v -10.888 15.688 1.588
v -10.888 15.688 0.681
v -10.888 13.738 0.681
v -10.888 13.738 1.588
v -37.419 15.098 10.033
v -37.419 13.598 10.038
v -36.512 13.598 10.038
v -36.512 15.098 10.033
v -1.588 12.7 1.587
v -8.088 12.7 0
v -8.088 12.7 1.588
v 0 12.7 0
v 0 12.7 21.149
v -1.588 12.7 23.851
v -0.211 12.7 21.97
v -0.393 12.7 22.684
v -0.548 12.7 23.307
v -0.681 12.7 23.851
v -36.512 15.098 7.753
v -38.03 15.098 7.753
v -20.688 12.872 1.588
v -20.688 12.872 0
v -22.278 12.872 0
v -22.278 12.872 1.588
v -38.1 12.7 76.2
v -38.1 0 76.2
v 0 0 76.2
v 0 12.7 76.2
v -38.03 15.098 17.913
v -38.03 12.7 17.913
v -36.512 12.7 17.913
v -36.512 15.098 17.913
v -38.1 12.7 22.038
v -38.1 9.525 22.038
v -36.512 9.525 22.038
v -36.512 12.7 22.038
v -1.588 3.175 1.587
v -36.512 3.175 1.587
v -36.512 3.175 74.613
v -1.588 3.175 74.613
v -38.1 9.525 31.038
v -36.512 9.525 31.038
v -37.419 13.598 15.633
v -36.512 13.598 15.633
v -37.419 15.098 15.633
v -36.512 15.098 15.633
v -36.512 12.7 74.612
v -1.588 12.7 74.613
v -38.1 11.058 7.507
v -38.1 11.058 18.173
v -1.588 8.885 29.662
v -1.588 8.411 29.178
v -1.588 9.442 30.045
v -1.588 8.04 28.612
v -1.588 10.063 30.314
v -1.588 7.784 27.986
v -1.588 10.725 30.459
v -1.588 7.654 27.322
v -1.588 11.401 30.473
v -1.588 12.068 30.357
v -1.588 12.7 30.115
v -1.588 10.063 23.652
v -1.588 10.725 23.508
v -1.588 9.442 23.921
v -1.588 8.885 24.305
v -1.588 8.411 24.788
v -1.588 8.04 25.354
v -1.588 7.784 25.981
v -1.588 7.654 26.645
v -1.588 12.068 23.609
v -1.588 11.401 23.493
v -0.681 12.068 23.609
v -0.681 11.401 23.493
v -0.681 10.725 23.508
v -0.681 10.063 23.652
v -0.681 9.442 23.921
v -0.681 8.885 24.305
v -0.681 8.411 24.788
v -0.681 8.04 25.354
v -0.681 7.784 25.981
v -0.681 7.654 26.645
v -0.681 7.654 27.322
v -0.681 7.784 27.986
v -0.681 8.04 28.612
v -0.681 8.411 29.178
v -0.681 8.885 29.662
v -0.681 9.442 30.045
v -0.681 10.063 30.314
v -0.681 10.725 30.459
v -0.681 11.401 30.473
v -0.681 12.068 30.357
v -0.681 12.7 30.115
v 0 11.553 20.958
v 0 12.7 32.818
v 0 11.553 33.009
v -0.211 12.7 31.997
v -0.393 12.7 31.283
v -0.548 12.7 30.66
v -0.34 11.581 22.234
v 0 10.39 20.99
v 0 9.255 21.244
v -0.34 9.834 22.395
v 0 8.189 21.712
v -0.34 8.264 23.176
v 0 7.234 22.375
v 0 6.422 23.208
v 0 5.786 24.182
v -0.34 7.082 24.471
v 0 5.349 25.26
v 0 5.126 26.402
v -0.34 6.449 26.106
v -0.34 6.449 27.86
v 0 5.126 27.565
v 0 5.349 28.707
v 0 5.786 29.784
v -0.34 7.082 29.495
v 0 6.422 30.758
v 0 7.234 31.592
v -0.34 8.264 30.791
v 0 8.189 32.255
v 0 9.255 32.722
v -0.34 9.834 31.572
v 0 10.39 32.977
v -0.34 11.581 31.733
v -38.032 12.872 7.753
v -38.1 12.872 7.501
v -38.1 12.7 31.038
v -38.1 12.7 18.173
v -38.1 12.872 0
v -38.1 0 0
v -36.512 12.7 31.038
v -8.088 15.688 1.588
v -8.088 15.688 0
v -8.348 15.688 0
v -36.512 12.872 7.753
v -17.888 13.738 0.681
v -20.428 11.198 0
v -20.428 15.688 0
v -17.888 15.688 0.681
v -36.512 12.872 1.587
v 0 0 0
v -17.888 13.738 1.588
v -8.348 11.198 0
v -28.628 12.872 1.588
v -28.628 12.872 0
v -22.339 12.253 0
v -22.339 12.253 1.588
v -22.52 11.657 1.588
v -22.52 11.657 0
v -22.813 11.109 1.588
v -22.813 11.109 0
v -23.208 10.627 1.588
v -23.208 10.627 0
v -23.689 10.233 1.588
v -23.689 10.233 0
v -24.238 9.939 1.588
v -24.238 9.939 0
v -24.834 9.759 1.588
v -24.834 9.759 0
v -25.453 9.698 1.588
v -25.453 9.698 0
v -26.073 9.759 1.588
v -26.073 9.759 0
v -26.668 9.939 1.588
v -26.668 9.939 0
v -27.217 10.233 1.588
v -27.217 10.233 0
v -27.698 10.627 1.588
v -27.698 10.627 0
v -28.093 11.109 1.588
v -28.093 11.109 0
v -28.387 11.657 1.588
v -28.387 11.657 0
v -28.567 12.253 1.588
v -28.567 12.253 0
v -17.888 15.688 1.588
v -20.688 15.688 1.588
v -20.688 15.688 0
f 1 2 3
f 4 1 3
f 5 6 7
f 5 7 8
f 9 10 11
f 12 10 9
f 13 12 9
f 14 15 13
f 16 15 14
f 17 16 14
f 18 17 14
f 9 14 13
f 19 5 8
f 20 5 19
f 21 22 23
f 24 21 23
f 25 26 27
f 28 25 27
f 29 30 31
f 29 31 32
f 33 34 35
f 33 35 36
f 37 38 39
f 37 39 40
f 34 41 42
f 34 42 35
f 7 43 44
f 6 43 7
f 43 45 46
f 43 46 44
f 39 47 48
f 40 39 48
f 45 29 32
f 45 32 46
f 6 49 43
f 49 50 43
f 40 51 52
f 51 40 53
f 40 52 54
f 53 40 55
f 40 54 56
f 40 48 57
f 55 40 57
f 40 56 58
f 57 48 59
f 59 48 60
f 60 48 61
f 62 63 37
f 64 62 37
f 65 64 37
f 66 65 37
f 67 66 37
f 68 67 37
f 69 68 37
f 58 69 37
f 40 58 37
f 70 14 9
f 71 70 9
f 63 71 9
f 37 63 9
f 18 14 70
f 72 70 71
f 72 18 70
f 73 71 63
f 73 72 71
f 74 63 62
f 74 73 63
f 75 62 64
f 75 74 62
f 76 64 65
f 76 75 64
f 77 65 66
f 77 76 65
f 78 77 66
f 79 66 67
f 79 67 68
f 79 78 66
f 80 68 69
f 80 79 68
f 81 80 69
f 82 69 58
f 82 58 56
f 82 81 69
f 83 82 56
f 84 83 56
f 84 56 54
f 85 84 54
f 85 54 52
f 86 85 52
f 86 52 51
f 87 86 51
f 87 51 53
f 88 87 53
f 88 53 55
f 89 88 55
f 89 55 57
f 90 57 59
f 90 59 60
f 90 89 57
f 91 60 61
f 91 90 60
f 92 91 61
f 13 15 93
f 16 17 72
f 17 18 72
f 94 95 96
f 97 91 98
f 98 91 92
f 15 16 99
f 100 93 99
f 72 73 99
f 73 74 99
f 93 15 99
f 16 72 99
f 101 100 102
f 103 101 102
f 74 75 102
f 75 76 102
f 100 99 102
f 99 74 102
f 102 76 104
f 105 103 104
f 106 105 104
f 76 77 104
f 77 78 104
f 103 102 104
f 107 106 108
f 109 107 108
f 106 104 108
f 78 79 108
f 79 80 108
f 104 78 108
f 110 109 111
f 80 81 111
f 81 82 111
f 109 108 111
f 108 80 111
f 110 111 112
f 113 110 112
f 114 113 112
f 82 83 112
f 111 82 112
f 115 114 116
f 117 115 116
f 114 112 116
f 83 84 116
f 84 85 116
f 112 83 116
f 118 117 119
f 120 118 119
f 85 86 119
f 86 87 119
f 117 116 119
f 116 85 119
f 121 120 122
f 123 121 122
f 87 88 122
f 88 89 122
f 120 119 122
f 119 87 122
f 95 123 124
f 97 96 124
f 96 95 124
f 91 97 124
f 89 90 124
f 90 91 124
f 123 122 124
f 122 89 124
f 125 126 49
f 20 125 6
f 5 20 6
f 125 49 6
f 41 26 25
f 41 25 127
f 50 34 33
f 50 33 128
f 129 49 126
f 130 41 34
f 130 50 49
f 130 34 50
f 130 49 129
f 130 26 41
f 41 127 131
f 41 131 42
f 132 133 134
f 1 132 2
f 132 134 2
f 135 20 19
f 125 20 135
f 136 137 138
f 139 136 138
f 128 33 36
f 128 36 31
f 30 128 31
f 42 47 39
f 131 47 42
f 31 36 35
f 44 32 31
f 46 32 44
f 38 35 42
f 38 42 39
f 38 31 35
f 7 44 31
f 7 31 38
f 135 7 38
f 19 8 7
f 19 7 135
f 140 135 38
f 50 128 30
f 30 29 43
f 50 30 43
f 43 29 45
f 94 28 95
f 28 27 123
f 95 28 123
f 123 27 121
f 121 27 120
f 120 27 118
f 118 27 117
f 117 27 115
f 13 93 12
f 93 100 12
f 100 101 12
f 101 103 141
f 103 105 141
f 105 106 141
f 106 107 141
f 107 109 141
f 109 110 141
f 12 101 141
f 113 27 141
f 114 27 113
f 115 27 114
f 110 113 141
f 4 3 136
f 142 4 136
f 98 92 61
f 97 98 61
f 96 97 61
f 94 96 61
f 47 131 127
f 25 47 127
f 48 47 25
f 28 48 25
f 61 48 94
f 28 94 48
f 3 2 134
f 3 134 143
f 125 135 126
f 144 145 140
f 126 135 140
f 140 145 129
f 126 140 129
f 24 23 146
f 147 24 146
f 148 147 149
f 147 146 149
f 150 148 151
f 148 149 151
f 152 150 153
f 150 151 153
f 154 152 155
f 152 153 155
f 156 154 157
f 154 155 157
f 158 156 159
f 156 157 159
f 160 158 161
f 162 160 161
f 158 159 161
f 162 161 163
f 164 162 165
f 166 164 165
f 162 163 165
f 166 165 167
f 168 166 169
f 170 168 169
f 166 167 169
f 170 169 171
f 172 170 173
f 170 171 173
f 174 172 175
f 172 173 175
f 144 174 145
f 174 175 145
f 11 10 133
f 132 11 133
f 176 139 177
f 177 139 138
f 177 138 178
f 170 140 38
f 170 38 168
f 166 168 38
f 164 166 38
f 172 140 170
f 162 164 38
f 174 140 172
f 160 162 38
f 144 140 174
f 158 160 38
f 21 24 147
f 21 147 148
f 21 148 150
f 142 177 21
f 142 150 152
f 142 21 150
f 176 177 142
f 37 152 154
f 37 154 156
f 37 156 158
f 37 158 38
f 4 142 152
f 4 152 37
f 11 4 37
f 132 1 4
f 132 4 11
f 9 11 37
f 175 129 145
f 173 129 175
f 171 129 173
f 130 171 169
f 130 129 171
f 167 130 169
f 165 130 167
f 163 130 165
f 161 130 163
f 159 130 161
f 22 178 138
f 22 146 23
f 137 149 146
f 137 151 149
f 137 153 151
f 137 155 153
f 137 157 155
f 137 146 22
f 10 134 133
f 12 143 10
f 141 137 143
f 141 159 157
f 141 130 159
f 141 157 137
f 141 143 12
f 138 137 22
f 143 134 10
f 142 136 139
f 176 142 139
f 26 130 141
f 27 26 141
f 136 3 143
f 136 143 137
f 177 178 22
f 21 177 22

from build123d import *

# Parameters (mm, degrees)
SKETCH1_W           = 38.1
SKETCH1_H           = 76.2
BOSS_EXTRUDE1_DEPTH = 15.875
SKETCH4_W           = 34.925
SKETCH4_H           = 73.025
CUT_EXTRUDE2_DEPTH  = 12.7
CUT_EXTRUDE3_DEPTH  = 1.5875
CHAMFER1_SIZE       = 2.54
CHAMFER1_SIZE2      = 0.680590949
CUT_EXTRUDE4_DEPTH  = 1.5875
CHAMFER2_SIZE       = 2.54
CHAMFER2_SIZE2      = 0.680590949
SKETCH7_W           = 34.925
SKETCH7_H           = 3.175
CUT_EXTRUDE5_DEPTH  = 1.5875
CUT_EXTRUDE6_DEPTH  = 1.5875


with BuildPart() as part:
    # Sketch1 → Boss-Extrude1 (new body)
    with BuildSketch(Plane(origin=(0, 0, 0), x_dir=(1, 0, 0), z_dir=(0, 1, 0))):
        with Locations((-19.05, -38.1)):
            Rectangle(SKETCH1_W, SKETCH1_H)
    extrude(amount=BOSS_EXTRUDE1_DEPTH)

    # Sketch4 → Cut-Extrude2 (cut)
    with BuildSketch(Plane(origin=(0, 15.875, 0), x_dir=(1, 0, 0), z_dir=(0, 1, 0))):
        with Locations((-19.05, -38.1)):
            Rectangle(SKETCH4_W, SKETCH4_H)
    extrude(amount=-CUT_EXTRUDE2_DEPTH, mode=Mode.SUBTRACT)

    # Sketch5 → Cut-Extrude3 (cut)
    with BuildSketch(Plane(origin=(0, 0, 0), x_dir=(0, 0, -1), z_dir=(1, 0, 0))):
        with BuildLine():
            Line((0, 12.7), (-23.851432546, 12.7))
            ThreePointArc((-23.851432546, 12.7), (-26.9833, 7.6375), (-30.115167454, 12.7))
            Line((-30.115167454, 12.7), (-76.2, 12.7))
            Line((-76.2, 12.7), (-76.2, 15.875))
            Line((-76.2, 15.875), (0, 15.875))
            Line((0, 15.875), (0, 12.7))
        make_face()
    extrude(amount=-CUT_EXTRUDE3_DEPTH, mode=Mode.SUBTRACT)

    # Chamfer1
    chamfer1_edges = [part.edges().sort_by_distance(p)[0] for p in [
        (0, 7.6375, 26.9833),
    ]]
    chamfer1_side = [part.faces().sort_by_distance(p)[0] for p in [
        (0, 6.21970244, 38.453254935),
    ]]
    chamfer(chamfer1_edges, length=CHAMFER1_SIZE, length2=CHAMFER1_SIZE2, reference=chamfer1_side[0])

    # Sketch6 → Cut-Extrude4 (cut)
    with BuildSketch(Plane(origin=(0, 0, 0), x_dir=(-1, 0, 0), z_dir=(0, 0, -1))):
        with BuildLine():
            Line((1.5875, 12.7), (8.0883, 12.7))
            Line((8.0883, 12.7), (8.0883, 15.6875))
            Line((8.0883, 15.6875), (10.8883, 15.6875))
            Line((10.8883, 15.6875), (10.8883, 13.7375))
            Line((10.8883, 13.7375), (17.8883, 13.7375))
            Line((17.8883, 13.7375), (17.8883, 15.6875))
            Line((17.8883, 15.6875), (20.6883, 15.6875))
            Line((20.6883, 15.6875), (20.6883, 12.8725))
            Line((20.6883, 12.8725), (22.2783, 12.8725))
            ThreePointArc((22.2783, 12.8725), (25.4533, 9.6975), (28.6283, 12.8725))
            Line((28.6283, 12.8725), (38.1, 12.8725))
            Line((38.1, 12.8725), (38.1, 15.875))
            Line((38.1, 15.875), (1.5875, 15.875))
            Line((1.5875, 15.875), (1.5875, 12.7))
        make_face()
    extrude(amount=-CUT_EXTRUDE4_DEPTH, mode=Mode.SUBTRACT)

    # Chamfer2
    chamfer2_edges = [part.edges().sort_by_distance(p)[0] for p in [
        (-10.8883, 14.7125, 0),
        (-14.3883, 13.7375, 0),
        (-17.8883, 14.7125, 0),
    ]]
    chamfer2_side = [part.faces().sort_by_distance(p)[0] for p in [
        (-18.682001646, 6.589374137, 0),
    ]]
    chamfer(chamfer2_edges, length=CHAMFER2_SIZE, length2=CHAMFER2_SIZE2, reference=chamfer2_side[0])

    # Sketch7 → Cut-Extrude5 (cut)
    with BuildSketch(Plane.XY.offset(76.2)):
        with Locations((-19.05, 14.2875)):
            Rectangle(SKETCH7_W, SKETCH7_H)
    extrude(amount=-CUT_EXTRUDE5_DEPTH, mode=Mode.SUBTRACT)

    # Sketch8 → Cut-Extrude6 (cut)
    with BuildSketch(Plane.ZY.offset(38.1)):
        Polygon((76.2, 12.7), (31.0375, 12.7), (31.0375, 9.525), (22.0375, 9.525), (22.0375, 12.7), (17.913122854, 12.7), (17.913122854, 15.0975), (15.633122854, 15.0975), (15.633122854, 13.5975), (10.038122854, 13.5975), (10.033122854, 15.0975), (7.753122854, 15.0975), (7.753122854, 12.8725), (1.5875, 12.8725), (1.5875, 15.875), (76.2, 15.875), align=None)
    extrude(amount=-CUT_EXTRUDE6_DEPTH, mode=Mode.SUBTRACT)

    # Chamfer3
    # the kernel refuses this chamfer: 2.54, 0.680590949 mm, written as the material it takes off along each edge
    with BuildSketch(Plane(origin=(-38.1, 7.001863854, 10.060108308), x_dir=(-0.009967146577155543, -0.003333149238426835, -0.9999447715275398), z_dir=(0, 0.9999944444907404, -0.003333314814970836))) as chamfer3_piece_1_section:
        with BuildLine():
            Line((2.638269115, 0), (-0.105178835, -0.705873694))
            Line((-0.105178835, -0.705873694), (-0.155976312, -0.705367363))
            ThreePointArc((-0.155976312, -0.705367363), (-0.0543203, -0.352919594), (-0.050797477, 0.000506331))
            Line((-0.050797477, 0.000506331), (0.000506331, 0.050797477))
            ThreePointArc((0.000506331, 0.050797477), (1.319509841, 0.037650122), (2.638775446, 0.050797477))
            Line((2.638775446, 0.050797477), (2.638269115, 0))
        make_face()
    chamfer3_piece_1 = extrude(amount=14.69135391, mode=Mode.PRIVATE)
    chamfer3_piece_1 = split(chamfer3_piece_1, bisect_by=Plane(origin=(-37.899401738, 15.0975, 9.151337031), z_dir=(0, -1, 0)), keep=Keep.TOP, mode=Mode.PRIVATE)
    chamfer3_piece_1 = split(chamfer3_piece_1, bisect_by=Plane(origin=(-37.899401738, 13.5975, 9.151337031), z_dir=(0, 1, 0)), keep=Keep.TOP, mode=Mode.PRIVATE)
    add(chamfer3_piece_1, mode=Mode.SUBTRACT)
    with BuildSketch(Plane(origin=(-38.1, 13.5975, 15.633122854), x_dir=(-0.009967146577155547, -0.9999503267608394, 0), z_dir=(0, 0, -1))) as chamfer3_piece_2_section:
        with BuildLine():
            Line((2.638269115, 0), (-0.105178835, -0.705873694))
            Line((-0.105178835, -0.705873694), (-0.155976312, -0.705367363))
            ThreePointArc((-0.155976312, -0.705367363), (-0.0543203, -0.352919594), (-0.050797477, 0.000506331))
            Line((-0.050797477, 0.000506331), (0.000506331, 0.050797477))
            ThreePointArc((0.000506331, 0.050797477), (1.319509841, 0.037650122), (2.638775446, 0.050797477))
            Line((2.638775446, 0.050797477), (2.638269115, 0))
        make_face()
    chamfer3_piece_2 = extrude(amount=12.190672788, mode=Mode.PRIVATE)
    chamfer3_piece_2 = split(chamfer3_piece_2, bisect_by=Plane(origin=(-37.899362184, 12.704169113, 10.041100623), z_dir=(0, 0.003333314814970836, 0.9999944444907404)), keep=Keep.TOP, mode=Mode.PRIVATE)
    add(chamfer3_piece_2, mode=Mode.SUBTRACT)
    with BuildSketch(Plane(origin=(-38.1, 15.0975, 15.633122854), x_dir=(-0.009967146577155547, -2.3683581360028347e-15, 0.9999503267608394), z_dir=(0, -1, 0))) as chamfer3_piece_3:
        with BuildLine():
            Line((2.638269115, 0), (-0.105178835, -0.705873694))
            Line((-0.105178835, -0.705873694), (-0.155976312, -0.705367363))
            ThreePointArc((-0.155976312, -0.705367363), (-0.0543203, -0.352919594), (-0.050797477, 0.000506331))
            Line((-0.050797477, 0.000506331), (0.000506331, 0.050797477))
            ThreePointArc((0.000506331, 0.050797477), (1.319509841, 0.037650122), (2.638775446, 0.050797477))
            Line((2.638775446, 0.050797477), (2.638269115, 0))
        make_face()
    extrude(amount=1.5, mode=Mode.SUBTRACT)
    with BuildSketch(Plane(origin=(-38.1, 7.001863854, 10.060108308), x_dir=(-0.009967146577155543, -0.003333149238426835, -0.9999447715275398), z_dir=(0, 0.9999944444907404, -0.003333314814970836))) as chamfer3_piece_4a_section:
        with BuildLine():
            Line((2.638269115, 0), (-0.105178835, -0.705873694))
            Line((-0.105178835, -0.705873694), (-0.155976312, -0.705367363))
            ThreePointArc((-0.155976312, -0.705367363), (-0.0543203, -0.352919594), (-0.050797477, 0.000506331))
            Line((-0.050797477, 0.000506331), (0.000506331, 0.050797477))
            ThreePointArc((0.000506331, 0.050797477), (1.319509841, 0.037650122), (2.638775446, 0.050797477))
            Line((2.638775446, 0.050797477), (2.638269115, 0))
        make_face()
    chamfer3_piece_4a = extrude(amount=14.69135391, mode=Mode.PRIVATE)
    chamfer3_piece_4a = split(chamfer3_piece_4a, bisect_by=Plane(origin=(-37.899435258, 13.5975, 9.16460585), z_dir=(0, -1, 0)), keep=Keep.TOP, mode=Mode.PRIVATE)
    with BuildSketch(Plane(origin=(-38.1, 13.5975, 15.633122854), x_dir=(-0.009967146577155547, -0.9999503267608394, 0), z_dir=(0, 0, -1))) as chamfer3_piece_4b_section:
        with BuildLine():
            Line((2.638269115, 0), (-0.105178835, -0.705873694))
            Line((-0.105178835, -0.705873694), (-0.155976312, -0.705367363))
            ThreePointArc((-0.155976312, -0.705367363), (-0.0543203, -0.352919594), (-0.050797477, 0.000506331))
            Line((-0.050797477, 0.000506331), (0.000506331, 0.050797477))
            ThreePointArc((0.000506331, 0.050797477), (1.319509841, 0.037650122), (2.638775446, 0.050797477))
            Line((2.638775446, 0.050797477), (2.638269115, 0))
        make_face()
    chamfer3_piece_4b = extrude(amount=12.190672788, mode=Mode.PRIVATE)
    chamfer3_piece_4b = split(chamfer3_piece_4b, bisect_by=Plane(origin=(-37.899435258, 12.723987849, 10.041034561), z_dir=(0, -0.003333314814970836, -0.9999944444907404)), keep=Keep.TOP, mode=Mode.PRIVATE)
    chamfer3_piece_4 = chamfer3_piece_4a & chamfer3_piece_4b
    add(chamfer3_piece_4, mode=Mode.SUBTRACT)
    with BuildSketch(Plane(origin=(-38.1, 13.5975, 22.228795642), x_dir=(-0.00996714657715554, -0.9999503267608394, 0), z_dir=(0, 0, -1))) as chamfer3_piece_5a_section:
        with BuildLine():
            Line((2.638269115, 0), (-0.105178835, -0.705873694))
            Line((-0.105178835, -0.705873694), (-0.155976312, -0.705367363))
            ThreePointArc((-0.155976312, -0.705367363), (-0.0543203, -0.352919594), (-0.050797477, 0.000506331))
            Line((-0.050797477, 0.000506331), (0.000506331, 0.050797477))
            ThreePointArc((0.000506331, 0.050797477), (1.319509841, 0.037650122), (2.638775446, 0.050797477))
            Line((2.638775446, 0.050797477), (2.638269115, 0))
        make_face()
    chamfer3_piece_5a = extrude(amount=18.786345577, mode=Mode.PRIVATE)
    chamfer3_piece_5a = split(chamfer3_piece_5a, bisect_by=Plane(origin=(-37.899401738, 12.71321909, 15.633122854), z_dir=(0, 0, 1)), keep=Keep.TOP, mode=Mode.PRIVATE)
    with BuildSketch(Plane(origin=(-38.1, 15.0975, 15.633122854), x_dir=(-0.009967146577155547, -2.3683581360028347e-15, 0.9999503267608394), z_dir=(0, -1, 0))) as chamfer3_piece_5b_section:
        with BuildLine():
            Line((2.638269115, 0), (-0.105178835, -0.705873694))
            Line((-0.105178835, -0.705873694), (-0.155976312, -0.705367363))
            ThreePointArc((-0.155976312, -0.705367363), (-0.0543203, -0.352919594), (-0.050797477, 0.000506331))
            Line((-0.050797477, 0.000506331), (0.000506331, 0.050797477))
            ThreePointArc((0.000506331, 0.050797477), (1.319509841, 0.037650122), (2.638775446, 0.050797477))
            Line((2.638775446, 0.050797477), (2.638269115, 0))
        make_face()
    chamfer3_piece_5b = extrude(amount=8.095672788, mode=Mode.PRIVATE)
    chamfer3_piece_5b = split(chamfer3_piece_5b, bisect_by=Plane(origin=(-37.899401738, 13.5975, 16.517403764), z_dir=(0, -1, 0)), keep=Keep.TOP, mode=Mode.PRIVATE)
    chamfer3_piece_5 = chamfer3_piece_5a & chamfer3_piece_5b
    add(chamfer3_piece_5, mode=Mode.SUBTRACT)


solid = part.part
